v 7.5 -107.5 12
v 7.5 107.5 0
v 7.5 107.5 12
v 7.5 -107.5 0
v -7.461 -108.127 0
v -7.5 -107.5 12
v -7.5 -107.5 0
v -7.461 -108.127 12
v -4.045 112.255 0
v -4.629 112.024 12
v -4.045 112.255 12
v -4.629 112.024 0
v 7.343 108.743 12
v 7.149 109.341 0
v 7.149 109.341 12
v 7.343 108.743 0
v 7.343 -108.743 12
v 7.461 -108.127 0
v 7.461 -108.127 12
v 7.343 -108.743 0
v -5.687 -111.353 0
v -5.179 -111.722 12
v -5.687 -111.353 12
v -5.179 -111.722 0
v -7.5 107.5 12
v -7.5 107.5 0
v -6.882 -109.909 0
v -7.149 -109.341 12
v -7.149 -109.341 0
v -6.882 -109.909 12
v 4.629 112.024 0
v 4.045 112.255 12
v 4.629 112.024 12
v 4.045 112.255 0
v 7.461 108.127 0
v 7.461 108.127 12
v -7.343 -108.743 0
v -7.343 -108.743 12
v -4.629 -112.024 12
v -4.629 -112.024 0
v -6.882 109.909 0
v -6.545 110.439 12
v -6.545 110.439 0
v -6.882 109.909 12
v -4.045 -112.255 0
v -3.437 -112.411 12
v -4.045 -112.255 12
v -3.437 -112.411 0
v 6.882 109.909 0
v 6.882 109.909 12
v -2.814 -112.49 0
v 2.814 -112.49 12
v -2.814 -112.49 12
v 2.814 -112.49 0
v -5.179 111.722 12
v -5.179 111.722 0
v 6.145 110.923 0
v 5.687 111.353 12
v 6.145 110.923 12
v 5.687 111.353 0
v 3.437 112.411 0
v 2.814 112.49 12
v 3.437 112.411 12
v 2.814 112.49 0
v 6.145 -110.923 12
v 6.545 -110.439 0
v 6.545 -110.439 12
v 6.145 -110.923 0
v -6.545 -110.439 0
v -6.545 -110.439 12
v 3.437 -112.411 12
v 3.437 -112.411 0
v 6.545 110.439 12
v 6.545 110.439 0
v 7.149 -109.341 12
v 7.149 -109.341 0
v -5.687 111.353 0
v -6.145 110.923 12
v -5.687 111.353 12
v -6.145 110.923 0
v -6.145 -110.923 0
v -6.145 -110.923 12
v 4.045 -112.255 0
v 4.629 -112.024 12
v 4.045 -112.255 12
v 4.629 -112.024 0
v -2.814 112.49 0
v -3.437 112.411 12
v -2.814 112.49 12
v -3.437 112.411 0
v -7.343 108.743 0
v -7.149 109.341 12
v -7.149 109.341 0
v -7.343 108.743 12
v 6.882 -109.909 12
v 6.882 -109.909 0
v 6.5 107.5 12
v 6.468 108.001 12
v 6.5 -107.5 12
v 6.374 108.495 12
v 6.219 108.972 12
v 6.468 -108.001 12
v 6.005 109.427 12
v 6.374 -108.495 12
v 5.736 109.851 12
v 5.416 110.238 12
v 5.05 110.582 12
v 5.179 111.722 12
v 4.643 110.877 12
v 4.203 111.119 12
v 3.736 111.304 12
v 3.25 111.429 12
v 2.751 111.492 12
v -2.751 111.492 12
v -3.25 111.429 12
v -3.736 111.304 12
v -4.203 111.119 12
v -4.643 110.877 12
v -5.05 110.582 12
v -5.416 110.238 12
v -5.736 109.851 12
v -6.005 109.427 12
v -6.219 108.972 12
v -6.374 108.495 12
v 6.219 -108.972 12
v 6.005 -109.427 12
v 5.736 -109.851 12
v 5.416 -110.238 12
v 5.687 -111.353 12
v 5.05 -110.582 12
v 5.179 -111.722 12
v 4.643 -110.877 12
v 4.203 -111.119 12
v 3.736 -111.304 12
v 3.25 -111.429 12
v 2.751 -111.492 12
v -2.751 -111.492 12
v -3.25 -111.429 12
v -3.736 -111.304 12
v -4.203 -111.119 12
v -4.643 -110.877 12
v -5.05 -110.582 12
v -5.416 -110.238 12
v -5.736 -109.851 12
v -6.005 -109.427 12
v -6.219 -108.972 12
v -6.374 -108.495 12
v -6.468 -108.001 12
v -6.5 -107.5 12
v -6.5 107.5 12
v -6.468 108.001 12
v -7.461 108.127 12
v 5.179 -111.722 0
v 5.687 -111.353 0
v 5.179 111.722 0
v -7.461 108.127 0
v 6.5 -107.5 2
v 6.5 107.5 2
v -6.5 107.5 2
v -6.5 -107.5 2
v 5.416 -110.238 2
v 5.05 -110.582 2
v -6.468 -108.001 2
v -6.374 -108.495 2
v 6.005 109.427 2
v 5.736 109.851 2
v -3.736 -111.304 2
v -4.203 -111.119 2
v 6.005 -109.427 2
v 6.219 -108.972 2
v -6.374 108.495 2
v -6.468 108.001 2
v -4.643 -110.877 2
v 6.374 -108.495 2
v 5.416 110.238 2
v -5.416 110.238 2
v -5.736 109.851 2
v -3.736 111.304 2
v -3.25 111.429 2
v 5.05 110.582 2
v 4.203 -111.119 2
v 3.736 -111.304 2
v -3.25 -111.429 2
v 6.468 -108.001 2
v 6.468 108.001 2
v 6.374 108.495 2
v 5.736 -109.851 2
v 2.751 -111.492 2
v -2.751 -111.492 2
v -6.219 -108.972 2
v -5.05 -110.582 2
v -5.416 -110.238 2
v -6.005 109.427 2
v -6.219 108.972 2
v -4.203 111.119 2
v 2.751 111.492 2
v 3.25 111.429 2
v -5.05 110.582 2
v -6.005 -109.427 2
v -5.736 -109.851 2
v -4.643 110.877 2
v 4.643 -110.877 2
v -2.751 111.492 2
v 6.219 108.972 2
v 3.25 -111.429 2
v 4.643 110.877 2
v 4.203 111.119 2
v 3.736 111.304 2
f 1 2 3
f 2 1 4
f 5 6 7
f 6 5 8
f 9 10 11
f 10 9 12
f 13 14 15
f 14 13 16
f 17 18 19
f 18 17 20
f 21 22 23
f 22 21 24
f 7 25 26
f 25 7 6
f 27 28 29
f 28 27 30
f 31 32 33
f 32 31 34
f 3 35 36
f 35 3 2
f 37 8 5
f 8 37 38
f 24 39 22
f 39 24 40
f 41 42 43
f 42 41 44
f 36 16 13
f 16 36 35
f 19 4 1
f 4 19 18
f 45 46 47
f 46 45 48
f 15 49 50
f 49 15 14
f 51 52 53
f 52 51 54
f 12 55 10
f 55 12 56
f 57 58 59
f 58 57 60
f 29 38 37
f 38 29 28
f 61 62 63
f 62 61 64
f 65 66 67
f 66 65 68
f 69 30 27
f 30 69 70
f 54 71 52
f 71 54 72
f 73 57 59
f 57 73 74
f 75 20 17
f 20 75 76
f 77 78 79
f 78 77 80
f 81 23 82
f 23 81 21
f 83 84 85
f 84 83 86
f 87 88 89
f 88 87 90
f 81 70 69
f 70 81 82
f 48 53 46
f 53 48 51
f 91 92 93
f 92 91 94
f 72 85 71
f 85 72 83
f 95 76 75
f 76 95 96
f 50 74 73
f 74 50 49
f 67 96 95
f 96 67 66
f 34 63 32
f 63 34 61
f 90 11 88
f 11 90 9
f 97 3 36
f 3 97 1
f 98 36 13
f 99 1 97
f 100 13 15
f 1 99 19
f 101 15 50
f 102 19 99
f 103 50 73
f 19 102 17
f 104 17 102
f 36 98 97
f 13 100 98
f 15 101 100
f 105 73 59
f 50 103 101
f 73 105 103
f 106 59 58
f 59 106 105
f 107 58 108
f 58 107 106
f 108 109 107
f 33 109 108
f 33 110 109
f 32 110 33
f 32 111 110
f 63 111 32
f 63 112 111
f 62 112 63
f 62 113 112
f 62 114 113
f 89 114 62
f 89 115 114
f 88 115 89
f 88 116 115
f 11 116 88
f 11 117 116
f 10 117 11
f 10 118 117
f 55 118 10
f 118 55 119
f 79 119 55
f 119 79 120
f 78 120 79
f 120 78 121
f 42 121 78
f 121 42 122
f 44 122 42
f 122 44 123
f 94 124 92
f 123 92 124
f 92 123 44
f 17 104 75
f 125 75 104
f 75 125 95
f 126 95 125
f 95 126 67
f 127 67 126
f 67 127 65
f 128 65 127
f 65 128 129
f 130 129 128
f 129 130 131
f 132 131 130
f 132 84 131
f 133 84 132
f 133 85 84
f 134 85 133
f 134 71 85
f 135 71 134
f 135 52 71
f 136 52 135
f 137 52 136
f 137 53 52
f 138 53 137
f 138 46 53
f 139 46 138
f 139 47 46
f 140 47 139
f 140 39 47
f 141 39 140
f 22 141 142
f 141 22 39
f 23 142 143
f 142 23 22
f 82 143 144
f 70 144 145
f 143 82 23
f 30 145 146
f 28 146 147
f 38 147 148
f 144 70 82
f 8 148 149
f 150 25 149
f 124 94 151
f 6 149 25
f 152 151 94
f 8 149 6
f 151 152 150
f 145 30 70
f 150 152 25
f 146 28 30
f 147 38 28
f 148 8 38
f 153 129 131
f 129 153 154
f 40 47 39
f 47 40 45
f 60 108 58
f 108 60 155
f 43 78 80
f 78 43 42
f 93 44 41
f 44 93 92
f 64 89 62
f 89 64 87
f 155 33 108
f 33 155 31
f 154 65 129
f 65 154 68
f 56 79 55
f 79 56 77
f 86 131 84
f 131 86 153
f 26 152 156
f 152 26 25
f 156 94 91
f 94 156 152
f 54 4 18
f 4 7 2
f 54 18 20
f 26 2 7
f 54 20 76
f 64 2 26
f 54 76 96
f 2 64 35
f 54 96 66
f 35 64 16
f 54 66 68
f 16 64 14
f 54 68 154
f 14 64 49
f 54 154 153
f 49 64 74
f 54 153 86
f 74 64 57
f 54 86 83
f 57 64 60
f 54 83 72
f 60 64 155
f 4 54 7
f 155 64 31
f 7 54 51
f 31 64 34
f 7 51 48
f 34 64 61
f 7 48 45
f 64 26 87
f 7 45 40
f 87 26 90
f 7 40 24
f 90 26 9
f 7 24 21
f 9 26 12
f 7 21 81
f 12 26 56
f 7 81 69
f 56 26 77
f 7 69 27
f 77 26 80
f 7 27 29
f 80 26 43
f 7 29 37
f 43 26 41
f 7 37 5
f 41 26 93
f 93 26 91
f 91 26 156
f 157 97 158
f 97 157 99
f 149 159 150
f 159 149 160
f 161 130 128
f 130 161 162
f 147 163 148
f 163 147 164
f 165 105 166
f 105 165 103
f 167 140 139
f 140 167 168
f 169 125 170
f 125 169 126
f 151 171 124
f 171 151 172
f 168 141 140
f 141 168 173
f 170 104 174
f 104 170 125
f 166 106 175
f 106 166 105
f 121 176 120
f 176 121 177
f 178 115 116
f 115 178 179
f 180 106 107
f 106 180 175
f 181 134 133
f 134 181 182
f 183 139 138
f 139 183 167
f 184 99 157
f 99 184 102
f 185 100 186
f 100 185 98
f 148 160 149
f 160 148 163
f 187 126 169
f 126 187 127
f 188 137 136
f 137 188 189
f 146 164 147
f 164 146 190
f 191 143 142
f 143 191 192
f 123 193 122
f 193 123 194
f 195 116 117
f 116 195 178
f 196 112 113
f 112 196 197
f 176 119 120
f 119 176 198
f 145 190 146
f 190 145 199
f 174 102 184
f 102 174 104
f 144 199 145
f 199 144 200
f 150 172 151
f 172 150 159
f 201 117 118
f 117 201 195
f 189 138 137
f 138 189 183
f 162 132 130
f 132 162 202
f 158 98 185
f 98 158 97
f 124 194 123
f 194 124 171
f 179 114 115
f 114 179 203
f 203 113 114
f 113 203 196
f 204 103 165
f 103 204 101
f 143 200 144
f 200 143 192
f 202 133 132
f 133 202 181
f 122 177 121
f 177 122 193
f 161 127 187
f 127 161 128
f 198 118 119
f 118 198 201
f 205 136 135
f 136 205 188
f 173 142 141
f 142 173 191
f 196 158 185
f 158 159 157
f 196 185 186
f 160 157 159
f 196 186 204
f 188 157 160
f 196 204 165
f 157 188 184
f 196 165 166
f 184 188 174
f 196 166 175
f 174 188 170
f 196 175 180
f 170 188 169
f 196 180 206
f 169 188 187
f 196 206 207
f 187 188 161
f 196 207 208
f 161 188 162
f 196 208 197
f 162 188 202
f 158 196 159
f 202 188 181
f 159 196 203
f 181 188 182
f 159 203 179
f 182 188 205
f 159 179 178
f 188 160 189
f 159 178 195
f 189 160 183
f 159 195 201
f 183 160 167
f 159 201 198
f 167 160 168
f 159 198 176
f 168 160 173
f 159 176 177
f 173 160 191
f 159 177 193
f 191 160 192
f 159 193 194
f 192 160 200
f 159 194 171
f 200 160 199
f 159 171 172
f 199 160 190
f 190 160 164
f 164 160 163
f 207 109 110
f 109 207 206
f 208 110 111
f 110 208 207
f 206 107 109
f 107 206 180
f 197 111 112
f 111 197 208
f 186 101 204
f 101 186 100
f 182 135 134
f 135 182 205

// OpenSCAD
$fn = 50;


difference() {
	union() {
		hull() {
			translate(v = [-2.5000000000, 107.5000000000, 0]) {
				cylinder(h = 12, r = 5);
			}
			translate(v = [2.5000000000, 107.5000000000, 0]) {
				cylinder(h = 12, r = 5);
			}
			translate(v = [-2.5000000000, -107.5000000000, 0]) {
				cylinder(h = 12, r = 5);
			}
			translate(v = [2.5000000000, -107.5000000000, 0]) {
				cylinder(h = 12, r = 5);
			}
		}
	}
	union() {
		translate(v = [0, 0, 2]) {
			hull() {
				translate(v = [-2.5000000000, 107.5000000000, 0]) {
					cylinder(h = 10, r = 4);
				}
				translate(v = [2.5000000000, 107.5000000000, 0]) {
					cylinder(h = 10, r = 4);
				}
				translate(v = [-2.5000000000, -107.5000000000, 0]) {
					cylinder(h = 10, r = 4);
				}
				translate(v = [2.5000000000, -107.5000000000, 0]) {
					cylinder(h = 10, r = 4);
				}
			}
		}
	}
}
